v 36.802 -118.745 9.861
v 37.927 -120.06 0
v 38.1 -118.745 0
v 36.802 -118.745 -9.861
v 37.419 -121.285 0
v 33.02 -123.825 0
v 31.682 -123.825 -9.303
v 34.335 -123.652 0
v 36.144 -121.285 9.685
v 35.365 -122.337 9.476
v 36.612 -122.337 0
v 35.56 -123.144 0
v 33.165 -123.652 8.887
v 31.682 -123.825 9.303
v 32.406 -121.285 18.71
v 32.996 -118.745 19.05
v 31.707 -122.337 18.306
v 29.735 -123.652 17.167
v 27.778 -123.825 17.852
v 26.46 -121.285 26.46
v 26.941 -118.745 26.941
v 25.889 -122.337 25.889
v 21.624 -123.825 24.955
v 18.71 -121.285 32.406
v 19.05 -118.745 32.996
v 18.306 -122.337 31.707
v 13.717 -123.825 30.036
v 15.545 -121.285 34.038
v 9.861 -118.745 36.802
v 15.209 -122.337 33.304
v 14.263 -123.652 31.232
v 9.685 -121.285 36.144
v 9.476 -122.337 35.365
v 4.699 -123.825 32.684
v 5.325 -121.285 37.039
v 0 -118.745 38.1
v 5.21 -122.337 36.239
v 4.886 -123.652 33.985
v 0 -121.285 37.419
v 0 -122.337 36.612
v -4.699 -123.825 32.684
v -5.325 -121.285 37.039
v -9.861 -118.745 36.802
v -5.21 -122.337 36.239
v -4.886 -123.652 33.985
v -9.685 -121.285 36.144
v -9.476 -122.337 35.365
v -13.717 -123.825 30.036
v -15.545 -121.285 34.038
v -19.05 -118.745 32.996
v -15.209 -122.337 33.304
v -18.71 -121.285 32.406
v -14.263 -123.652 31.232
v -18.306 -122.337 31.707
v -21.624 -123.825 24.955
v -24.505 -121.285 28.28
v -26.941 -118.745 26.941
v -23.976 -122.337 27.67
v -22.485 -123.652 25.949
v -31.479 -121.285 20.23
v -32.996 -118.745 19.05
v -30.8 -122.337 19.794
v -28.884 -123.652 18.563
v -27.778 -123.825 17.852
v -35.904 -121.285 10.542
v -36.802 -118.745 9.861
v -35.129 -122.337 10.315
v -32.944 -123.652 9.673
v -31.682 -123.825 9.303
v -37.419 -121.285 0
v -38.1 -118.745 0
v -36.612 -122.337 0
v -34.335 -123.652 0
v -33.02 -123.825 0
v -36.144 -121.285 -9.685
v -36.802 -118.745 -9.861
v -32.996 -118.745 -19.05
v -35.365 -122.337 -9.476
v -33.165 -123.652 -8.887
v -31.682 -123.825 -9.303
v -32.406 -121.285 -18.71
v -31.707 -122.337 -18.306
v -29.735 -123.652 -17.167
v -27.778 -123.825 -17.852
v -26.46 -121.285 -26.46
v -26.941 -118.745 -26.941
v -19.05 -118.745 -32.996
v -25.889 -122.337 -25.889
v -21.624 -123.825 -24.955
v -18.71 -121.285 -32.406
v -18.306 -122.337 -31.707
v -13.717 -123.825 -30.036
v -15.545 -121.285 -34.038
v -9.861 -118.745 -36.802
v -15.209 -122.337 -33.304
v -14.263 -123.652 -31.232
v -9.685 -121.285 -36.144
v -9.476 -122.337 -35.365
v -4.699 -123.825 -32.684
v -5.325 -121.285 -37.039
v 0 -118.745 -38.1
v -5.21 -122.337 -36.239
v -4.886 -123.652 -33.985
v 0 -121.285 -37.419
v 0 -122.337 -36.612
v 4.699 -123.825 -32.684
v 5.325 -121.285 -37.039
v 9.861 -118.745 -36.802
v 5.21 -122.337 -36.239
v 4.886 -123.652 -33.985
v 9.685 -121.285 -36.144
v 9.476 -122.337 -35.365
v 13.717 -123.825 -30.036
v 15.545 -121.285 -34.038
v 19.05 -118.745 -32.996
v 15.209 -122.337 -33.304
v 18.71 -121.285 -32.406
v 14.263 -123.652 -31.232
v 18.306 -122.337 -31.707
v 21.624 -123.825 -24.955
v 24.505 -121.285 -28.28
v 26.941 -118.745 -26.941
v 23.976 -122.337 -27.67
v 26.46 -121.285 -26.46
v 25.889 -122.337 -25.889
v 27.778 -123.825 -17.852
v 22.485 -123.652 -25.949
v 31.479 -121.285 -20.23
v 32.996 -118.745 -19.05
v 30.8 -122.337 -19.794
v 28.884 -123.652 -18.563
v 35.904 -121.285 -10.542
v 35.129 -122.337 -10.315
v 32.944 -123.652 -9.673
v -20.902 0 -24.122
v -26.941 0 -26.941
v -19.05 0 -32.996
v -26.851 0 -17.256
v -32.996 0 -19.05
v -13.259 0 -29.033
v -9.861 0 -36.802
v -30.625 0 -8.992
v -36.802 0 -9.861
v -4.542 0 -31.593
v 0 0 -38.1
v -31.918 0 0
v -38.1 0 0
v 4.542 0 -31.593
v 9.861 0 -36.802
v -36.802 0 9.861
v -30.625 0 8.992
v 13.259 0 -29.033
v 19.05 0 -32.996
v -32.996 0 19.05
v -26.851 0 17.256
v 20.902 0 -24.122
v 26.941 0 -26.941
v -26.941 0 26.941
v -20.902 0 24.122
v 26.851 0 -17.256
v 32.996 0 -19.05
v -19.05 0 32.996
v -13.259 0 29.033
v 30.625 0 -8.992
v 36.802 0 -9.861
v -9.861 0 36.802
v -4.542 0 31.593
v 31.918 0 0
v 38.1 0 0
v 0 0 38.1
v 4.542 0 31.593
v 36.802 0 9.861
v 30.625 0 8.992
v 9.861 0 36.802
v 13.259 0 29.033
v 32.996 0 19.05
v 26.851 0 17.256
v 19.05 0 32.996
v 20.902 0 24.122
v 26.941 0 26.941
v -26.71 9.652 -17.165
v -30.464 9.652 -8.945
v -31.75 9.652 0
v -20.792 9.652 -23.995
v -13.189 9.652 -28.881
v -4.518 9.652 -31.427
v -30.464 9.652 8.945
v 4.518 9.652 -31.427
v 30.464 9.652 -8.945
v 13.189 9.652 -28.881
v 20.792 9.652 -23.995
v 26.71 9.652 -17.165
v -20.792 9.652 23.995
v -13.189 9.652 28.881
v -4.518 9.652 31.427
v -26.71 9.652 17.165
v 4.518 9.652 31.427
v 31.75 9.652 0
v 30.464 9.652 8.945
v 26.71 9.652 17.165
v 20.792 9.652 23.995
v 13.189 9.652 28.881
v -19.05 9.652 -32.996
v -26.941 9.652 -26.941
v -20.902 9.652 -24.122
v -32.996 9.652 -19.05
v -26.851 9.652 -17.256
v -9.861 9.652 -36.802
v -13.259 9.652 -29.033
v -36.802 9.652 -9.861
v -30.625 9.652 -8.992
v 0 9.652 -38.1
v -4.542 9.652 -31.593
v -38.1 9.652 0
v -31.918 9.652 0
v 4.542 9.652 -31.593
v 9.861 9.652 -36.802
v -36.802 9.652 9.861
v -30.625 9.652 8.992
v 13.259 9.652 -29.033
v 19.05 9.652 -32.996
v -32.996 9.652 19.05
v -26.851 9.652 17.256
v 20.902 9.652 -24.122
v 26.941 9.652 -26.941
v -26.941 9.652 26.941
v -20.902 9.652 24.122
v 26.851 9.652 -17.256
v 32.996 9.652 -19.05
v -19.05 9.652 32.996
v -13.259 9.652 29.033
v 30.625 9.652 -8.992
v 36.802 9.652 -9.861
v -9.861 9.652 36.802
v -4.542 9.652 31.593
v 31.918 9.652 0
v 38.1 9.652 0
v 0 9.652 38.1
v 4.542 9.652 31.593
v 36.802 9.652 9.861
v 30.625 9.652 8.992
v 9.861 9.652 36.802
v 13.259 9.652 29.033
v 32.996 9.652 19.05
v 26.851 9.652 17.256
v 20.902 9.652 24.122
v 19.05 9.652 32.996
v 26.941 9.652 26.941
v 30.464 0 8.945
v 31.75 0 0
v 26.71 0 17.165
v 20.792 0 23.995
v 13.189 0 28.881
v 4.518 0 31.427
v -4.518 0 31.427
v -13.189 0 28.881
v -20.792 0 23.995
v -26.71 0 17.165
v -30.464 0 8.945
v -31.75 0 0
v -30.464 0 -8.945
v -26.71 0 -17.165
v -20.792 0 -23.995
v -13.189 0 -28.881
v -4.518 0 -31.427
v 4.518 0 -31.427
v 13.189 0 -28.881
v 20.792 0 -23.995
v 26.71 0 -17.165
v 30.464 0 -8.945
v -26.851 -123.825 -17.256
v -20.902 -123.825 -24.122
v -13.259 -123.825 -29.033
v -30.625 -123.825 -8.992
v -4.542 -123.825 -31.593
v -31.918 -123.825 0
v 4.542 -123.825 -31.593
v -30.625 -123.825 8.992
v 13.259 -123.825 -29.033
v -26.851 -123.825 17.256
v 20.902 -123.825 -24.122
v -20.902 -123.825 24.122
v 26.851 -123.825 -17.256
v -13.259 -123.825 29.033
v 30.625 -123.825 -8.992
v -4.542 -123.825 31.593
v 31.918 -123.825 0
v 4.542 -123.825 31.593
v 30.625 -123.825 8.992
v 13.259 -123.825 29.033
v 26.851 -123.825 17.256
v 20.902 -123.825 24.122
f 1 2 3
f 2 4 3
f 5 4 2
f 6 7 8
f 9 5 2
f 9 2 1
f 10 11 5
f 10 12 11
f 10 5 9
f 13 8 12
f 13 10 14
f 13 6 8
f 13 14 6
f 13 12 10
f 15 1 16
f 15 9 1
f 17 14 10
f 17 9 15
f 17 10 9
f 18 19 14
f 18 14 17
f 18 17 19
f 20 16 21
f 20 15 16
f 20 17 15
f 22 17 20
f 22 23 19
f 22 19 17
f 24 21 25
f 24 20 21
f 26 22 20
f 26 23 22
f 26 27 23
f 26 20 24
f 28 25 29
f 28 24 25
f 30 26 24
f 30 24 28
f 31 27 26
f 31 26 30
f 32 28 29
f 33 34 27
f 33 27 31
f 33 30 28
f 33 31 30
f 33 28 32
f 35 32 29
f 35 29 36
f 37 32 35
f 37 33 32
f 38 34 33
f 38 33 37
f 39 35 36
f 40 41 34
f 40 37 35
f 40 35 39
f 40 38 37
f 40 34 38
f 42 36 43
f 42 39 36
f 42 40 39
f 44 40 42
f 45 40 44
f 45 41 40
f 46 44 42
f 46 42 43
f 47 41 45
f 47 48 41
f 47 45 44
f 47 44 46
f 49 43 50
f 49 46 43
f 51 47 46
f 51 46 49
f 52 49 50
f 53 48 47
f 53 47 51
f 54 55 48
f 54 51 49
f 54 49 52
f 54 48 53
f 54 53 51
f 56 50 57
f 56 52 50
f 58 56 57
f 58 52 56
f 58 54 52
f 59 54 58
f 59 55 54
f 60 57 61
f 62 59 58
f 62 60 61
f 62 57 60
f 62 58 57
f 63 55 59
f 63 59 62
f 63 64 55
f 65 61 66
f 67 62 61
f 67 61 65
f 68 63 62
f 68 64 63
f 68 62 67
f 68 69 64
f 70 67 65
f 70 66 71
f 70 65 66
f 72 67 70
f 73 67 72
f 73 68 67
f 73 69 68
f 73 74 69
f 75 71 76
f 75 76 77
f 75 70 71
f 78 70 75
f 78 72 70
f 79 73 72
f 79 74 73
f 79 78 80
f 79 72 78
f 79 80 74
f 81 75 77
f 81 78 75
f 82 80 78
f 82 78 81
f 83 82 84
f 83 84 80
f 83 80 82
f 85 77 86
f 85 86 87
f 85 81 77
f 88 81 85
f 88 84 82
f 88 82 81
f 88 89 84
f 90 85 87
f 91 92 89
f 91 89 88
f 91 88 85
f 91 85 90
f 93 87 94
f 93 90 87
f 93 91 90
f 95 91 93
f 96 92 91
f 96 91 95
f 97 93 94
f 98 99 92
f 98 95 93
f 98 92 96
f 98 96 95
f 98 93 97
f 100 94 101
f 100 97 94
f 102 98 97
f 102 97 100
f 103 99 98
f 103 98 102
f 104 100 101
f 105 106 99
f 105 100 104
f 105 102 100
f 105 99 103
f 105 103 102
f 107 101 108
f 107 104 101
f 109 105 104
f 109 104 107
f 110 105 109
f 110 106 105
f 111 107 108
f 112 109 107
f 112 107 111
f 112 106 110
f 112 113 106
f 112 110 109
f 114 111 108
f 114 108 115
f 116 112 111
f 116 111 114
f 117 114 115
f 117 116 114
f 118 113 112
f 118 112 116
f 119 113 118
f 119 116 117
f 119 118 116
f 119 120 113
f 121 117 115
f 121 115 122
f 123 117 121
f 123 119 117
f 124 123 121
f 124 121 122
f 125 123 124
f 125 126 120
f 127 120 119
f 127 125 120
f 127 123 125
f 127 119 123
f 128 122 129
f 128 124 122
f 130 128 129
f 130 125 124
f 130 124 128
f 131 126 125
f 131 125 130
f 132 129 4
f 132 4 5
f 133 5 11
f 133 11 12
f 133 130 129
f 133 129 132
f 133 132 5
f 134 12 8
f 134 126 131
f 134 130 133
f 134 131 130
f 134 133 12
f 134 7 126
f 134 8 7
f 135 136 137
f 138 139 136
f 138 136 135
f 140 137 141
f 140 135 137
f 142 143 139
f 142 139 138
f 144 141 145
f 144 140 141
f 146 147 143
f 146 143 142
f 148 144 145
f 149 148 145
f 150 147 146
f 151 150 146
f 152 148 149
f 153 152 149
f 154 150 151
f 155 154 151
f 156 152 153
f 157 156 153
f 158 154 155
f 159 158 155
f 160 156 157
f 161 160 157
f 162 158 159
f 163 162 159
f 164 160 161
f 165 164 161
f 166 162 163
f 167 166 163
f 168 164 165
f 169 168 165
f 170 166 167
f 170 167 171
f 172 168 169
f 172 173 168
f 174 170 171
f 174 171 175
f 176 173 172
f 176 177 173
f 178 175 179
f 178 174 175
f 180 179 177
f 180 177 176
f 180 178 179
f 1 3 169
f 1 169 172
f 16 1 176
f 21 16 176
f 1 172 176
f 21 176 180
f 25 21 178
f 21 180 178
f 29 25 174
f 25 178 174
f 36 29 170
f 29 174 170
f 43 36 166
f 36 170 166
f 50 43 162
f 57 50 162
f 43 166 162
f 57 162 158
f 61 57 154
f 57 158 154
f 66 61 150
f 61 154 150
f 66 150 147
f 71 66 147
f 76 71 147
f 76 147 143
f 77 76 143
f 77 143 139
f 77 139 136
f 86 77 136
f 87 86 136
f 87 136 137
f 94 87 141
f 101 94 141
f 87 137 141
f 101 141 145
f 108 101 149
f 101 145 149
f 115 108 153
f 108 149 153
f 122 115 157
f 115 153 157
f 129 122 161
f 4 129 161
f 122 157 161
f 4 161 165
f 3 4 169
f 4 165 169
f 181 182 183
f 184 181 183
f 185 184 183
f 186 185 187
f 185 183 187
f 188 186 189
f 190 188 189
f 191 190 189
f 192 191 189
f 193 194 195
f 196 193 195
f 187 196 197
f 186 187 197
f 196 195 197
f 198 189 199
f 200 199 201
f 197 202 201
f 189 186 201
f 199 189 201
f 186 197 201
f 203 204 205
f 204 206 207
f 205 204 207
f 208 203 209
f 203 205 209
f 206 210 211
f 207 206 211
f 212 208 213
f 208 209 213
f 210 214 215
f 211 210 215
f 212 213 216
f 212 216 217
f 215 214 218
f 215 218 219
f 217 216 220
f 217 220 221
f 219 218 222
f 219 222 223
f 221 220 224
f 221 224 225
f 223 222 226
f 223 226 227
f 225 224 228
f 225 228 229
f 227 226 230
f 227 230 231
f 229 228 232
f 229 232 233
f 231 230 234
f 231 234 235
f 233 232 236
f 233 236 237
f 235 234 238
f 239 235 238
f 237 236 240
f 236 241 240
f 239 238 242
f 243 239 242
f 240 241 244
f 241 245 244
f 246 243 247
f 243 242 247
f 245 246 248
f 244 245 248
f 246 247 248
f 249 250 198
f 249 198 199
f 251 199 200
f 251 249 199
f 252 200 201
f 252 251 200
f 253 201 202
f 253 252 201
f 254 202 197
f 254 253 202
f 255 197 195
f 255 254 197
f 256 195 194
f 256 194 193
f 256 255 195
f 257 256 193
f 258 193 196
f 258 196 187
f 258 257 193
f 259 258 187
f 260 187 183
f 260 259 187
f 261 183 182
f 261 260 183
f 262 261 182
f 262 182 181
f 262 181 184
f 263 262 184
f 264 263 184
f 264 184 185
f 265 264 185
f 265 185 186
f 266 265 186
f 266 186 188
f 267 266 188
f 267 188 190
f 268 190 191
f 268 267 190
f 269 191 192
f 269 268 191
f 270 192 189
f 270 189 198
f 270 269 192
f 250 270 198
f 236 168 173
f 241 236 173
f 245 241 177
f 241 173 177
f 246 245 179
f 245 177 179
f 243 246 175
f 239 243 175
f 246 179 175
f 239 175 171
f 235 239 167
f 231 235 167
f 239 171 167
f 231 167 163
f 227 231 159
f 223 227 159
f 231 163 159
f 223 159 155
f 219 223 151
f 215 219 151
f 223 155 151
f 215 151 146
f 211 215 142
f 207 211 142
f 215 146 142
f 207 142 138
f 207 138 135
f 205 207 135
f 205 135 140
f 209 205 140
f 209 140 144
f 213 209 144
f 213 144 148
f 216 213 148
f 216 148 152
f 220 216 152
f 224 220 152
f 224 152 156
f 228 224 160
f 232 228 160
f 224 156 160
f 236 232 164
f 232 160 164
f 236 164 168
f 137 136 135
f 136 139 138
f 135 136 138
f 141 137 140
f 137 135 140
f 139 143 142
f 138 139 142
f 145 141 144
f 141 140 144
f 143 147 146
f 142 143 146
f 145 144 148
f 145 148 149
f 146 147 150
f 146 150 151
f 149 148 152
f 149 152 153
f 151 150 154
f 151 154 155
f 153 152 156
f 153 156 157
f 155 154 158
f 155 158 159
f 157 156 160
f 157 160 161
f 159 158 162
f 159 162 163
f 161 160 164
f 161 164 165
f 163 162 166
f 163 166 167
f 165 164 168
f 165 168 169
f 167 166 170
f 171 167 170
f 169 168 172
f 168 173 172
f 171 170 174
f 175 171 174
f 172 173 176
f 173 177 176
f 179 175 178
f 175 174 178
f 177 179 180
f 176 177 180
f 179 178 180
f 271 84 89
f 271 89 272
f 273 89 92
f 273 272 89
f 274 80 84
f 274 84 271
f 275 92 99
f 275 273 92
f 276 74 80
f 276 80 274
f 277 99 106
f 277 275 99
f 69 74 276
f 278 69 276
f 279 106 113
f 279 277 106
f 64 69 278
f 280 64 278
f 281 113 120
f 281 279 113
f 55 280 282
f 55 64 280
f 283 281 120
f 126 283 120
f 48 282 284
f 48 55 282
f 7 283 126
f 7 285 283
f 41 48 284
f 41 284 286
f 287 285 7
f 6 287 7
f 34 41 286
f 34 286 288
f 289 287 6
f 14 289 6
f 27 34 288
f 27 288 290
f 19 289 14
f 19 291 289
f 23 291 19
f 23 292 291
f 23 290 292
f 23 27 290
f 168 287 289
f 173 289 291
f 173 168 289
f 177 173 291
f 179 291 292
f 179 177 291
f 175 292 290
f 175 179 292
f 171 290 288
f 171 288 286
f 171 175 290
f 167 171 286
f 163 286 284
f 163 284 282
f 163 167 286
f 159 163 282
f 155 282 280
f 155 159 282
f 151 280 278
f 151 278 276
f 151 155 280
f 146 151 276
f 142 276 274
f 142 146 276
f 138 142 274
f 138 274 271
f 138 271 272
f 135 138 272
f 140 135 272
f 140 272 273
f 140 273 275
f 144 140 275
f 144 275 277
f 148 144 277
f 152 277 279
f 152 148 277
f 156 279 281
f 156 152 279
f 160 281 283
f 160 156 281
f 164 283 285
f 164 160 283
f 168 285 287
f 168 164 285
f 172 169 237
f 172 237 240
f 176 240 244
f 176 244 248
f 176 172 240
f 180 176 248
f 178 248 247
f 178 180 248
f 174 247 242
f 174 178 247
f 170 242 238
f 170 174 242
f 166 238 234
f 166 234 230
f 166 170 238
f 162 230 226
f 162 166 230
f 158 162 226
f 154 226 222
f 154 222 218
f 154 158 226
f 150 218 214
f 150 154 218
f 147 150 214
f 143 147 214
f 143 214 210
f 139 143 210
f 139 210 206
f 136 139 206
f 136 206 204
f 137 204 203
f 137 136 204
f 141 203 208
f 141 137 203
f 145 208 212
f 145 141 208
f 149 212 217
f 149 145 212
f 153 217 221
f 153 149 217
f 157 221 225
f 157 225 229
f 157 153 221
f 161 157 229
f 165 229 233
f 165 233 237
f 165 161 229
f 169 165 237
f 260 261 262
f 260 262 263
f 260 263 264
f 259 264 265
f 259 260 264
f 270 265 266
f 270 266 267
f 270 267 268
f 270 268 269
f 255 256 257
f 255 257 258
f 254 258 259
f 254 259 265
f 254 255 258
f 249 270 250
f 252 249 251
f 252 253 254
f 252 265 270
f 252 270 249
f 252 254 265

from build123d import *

# Parameters (mm, degrees)
F0_R     = 38.1
F0_R_2   = 31.9176226604
F1_DEPTH = 123.825
F2_R     = 5.08
F0_R_3   = 31.75
F3_DEPTH = 9.652


with BuildPart() as f1:
    # F0 (on Front) → F1 (new body)
    with BuildSketch(Plane.XZ):
        Circle(F0_R)
        Circle(F0_R_2, mode=Mode.SUBTRACT)
    extrude(amount=F1_DEPTH)

    # F2
    f2_edges = [f1.edges().sort_by_distance(p)[0] for p in [
        (-38.1, -123.825, 0),
    ]]
    fillet(f2_edges, radius=F2_R)


with BuildPart() as f3:
    # F0 (on Front) → F3 (new body)
    with BuildSketch(Plane.XZ):
        Circle(F0_R_3)
    extrude(amount=-F3_DEPTH)


with BuildPart() as f3b:
    # F0 (on Front) → F3, piece 2 (new body)
    with BuildSketch(Plane.XZ):
        Circle(F0_R)
        Circle(F0_R_2, mode=Mode.SUBTRACT)
    extrude(amount=-F3_DEPTH)


solid = Compound([f1.part, f3.part, f3b.part])
